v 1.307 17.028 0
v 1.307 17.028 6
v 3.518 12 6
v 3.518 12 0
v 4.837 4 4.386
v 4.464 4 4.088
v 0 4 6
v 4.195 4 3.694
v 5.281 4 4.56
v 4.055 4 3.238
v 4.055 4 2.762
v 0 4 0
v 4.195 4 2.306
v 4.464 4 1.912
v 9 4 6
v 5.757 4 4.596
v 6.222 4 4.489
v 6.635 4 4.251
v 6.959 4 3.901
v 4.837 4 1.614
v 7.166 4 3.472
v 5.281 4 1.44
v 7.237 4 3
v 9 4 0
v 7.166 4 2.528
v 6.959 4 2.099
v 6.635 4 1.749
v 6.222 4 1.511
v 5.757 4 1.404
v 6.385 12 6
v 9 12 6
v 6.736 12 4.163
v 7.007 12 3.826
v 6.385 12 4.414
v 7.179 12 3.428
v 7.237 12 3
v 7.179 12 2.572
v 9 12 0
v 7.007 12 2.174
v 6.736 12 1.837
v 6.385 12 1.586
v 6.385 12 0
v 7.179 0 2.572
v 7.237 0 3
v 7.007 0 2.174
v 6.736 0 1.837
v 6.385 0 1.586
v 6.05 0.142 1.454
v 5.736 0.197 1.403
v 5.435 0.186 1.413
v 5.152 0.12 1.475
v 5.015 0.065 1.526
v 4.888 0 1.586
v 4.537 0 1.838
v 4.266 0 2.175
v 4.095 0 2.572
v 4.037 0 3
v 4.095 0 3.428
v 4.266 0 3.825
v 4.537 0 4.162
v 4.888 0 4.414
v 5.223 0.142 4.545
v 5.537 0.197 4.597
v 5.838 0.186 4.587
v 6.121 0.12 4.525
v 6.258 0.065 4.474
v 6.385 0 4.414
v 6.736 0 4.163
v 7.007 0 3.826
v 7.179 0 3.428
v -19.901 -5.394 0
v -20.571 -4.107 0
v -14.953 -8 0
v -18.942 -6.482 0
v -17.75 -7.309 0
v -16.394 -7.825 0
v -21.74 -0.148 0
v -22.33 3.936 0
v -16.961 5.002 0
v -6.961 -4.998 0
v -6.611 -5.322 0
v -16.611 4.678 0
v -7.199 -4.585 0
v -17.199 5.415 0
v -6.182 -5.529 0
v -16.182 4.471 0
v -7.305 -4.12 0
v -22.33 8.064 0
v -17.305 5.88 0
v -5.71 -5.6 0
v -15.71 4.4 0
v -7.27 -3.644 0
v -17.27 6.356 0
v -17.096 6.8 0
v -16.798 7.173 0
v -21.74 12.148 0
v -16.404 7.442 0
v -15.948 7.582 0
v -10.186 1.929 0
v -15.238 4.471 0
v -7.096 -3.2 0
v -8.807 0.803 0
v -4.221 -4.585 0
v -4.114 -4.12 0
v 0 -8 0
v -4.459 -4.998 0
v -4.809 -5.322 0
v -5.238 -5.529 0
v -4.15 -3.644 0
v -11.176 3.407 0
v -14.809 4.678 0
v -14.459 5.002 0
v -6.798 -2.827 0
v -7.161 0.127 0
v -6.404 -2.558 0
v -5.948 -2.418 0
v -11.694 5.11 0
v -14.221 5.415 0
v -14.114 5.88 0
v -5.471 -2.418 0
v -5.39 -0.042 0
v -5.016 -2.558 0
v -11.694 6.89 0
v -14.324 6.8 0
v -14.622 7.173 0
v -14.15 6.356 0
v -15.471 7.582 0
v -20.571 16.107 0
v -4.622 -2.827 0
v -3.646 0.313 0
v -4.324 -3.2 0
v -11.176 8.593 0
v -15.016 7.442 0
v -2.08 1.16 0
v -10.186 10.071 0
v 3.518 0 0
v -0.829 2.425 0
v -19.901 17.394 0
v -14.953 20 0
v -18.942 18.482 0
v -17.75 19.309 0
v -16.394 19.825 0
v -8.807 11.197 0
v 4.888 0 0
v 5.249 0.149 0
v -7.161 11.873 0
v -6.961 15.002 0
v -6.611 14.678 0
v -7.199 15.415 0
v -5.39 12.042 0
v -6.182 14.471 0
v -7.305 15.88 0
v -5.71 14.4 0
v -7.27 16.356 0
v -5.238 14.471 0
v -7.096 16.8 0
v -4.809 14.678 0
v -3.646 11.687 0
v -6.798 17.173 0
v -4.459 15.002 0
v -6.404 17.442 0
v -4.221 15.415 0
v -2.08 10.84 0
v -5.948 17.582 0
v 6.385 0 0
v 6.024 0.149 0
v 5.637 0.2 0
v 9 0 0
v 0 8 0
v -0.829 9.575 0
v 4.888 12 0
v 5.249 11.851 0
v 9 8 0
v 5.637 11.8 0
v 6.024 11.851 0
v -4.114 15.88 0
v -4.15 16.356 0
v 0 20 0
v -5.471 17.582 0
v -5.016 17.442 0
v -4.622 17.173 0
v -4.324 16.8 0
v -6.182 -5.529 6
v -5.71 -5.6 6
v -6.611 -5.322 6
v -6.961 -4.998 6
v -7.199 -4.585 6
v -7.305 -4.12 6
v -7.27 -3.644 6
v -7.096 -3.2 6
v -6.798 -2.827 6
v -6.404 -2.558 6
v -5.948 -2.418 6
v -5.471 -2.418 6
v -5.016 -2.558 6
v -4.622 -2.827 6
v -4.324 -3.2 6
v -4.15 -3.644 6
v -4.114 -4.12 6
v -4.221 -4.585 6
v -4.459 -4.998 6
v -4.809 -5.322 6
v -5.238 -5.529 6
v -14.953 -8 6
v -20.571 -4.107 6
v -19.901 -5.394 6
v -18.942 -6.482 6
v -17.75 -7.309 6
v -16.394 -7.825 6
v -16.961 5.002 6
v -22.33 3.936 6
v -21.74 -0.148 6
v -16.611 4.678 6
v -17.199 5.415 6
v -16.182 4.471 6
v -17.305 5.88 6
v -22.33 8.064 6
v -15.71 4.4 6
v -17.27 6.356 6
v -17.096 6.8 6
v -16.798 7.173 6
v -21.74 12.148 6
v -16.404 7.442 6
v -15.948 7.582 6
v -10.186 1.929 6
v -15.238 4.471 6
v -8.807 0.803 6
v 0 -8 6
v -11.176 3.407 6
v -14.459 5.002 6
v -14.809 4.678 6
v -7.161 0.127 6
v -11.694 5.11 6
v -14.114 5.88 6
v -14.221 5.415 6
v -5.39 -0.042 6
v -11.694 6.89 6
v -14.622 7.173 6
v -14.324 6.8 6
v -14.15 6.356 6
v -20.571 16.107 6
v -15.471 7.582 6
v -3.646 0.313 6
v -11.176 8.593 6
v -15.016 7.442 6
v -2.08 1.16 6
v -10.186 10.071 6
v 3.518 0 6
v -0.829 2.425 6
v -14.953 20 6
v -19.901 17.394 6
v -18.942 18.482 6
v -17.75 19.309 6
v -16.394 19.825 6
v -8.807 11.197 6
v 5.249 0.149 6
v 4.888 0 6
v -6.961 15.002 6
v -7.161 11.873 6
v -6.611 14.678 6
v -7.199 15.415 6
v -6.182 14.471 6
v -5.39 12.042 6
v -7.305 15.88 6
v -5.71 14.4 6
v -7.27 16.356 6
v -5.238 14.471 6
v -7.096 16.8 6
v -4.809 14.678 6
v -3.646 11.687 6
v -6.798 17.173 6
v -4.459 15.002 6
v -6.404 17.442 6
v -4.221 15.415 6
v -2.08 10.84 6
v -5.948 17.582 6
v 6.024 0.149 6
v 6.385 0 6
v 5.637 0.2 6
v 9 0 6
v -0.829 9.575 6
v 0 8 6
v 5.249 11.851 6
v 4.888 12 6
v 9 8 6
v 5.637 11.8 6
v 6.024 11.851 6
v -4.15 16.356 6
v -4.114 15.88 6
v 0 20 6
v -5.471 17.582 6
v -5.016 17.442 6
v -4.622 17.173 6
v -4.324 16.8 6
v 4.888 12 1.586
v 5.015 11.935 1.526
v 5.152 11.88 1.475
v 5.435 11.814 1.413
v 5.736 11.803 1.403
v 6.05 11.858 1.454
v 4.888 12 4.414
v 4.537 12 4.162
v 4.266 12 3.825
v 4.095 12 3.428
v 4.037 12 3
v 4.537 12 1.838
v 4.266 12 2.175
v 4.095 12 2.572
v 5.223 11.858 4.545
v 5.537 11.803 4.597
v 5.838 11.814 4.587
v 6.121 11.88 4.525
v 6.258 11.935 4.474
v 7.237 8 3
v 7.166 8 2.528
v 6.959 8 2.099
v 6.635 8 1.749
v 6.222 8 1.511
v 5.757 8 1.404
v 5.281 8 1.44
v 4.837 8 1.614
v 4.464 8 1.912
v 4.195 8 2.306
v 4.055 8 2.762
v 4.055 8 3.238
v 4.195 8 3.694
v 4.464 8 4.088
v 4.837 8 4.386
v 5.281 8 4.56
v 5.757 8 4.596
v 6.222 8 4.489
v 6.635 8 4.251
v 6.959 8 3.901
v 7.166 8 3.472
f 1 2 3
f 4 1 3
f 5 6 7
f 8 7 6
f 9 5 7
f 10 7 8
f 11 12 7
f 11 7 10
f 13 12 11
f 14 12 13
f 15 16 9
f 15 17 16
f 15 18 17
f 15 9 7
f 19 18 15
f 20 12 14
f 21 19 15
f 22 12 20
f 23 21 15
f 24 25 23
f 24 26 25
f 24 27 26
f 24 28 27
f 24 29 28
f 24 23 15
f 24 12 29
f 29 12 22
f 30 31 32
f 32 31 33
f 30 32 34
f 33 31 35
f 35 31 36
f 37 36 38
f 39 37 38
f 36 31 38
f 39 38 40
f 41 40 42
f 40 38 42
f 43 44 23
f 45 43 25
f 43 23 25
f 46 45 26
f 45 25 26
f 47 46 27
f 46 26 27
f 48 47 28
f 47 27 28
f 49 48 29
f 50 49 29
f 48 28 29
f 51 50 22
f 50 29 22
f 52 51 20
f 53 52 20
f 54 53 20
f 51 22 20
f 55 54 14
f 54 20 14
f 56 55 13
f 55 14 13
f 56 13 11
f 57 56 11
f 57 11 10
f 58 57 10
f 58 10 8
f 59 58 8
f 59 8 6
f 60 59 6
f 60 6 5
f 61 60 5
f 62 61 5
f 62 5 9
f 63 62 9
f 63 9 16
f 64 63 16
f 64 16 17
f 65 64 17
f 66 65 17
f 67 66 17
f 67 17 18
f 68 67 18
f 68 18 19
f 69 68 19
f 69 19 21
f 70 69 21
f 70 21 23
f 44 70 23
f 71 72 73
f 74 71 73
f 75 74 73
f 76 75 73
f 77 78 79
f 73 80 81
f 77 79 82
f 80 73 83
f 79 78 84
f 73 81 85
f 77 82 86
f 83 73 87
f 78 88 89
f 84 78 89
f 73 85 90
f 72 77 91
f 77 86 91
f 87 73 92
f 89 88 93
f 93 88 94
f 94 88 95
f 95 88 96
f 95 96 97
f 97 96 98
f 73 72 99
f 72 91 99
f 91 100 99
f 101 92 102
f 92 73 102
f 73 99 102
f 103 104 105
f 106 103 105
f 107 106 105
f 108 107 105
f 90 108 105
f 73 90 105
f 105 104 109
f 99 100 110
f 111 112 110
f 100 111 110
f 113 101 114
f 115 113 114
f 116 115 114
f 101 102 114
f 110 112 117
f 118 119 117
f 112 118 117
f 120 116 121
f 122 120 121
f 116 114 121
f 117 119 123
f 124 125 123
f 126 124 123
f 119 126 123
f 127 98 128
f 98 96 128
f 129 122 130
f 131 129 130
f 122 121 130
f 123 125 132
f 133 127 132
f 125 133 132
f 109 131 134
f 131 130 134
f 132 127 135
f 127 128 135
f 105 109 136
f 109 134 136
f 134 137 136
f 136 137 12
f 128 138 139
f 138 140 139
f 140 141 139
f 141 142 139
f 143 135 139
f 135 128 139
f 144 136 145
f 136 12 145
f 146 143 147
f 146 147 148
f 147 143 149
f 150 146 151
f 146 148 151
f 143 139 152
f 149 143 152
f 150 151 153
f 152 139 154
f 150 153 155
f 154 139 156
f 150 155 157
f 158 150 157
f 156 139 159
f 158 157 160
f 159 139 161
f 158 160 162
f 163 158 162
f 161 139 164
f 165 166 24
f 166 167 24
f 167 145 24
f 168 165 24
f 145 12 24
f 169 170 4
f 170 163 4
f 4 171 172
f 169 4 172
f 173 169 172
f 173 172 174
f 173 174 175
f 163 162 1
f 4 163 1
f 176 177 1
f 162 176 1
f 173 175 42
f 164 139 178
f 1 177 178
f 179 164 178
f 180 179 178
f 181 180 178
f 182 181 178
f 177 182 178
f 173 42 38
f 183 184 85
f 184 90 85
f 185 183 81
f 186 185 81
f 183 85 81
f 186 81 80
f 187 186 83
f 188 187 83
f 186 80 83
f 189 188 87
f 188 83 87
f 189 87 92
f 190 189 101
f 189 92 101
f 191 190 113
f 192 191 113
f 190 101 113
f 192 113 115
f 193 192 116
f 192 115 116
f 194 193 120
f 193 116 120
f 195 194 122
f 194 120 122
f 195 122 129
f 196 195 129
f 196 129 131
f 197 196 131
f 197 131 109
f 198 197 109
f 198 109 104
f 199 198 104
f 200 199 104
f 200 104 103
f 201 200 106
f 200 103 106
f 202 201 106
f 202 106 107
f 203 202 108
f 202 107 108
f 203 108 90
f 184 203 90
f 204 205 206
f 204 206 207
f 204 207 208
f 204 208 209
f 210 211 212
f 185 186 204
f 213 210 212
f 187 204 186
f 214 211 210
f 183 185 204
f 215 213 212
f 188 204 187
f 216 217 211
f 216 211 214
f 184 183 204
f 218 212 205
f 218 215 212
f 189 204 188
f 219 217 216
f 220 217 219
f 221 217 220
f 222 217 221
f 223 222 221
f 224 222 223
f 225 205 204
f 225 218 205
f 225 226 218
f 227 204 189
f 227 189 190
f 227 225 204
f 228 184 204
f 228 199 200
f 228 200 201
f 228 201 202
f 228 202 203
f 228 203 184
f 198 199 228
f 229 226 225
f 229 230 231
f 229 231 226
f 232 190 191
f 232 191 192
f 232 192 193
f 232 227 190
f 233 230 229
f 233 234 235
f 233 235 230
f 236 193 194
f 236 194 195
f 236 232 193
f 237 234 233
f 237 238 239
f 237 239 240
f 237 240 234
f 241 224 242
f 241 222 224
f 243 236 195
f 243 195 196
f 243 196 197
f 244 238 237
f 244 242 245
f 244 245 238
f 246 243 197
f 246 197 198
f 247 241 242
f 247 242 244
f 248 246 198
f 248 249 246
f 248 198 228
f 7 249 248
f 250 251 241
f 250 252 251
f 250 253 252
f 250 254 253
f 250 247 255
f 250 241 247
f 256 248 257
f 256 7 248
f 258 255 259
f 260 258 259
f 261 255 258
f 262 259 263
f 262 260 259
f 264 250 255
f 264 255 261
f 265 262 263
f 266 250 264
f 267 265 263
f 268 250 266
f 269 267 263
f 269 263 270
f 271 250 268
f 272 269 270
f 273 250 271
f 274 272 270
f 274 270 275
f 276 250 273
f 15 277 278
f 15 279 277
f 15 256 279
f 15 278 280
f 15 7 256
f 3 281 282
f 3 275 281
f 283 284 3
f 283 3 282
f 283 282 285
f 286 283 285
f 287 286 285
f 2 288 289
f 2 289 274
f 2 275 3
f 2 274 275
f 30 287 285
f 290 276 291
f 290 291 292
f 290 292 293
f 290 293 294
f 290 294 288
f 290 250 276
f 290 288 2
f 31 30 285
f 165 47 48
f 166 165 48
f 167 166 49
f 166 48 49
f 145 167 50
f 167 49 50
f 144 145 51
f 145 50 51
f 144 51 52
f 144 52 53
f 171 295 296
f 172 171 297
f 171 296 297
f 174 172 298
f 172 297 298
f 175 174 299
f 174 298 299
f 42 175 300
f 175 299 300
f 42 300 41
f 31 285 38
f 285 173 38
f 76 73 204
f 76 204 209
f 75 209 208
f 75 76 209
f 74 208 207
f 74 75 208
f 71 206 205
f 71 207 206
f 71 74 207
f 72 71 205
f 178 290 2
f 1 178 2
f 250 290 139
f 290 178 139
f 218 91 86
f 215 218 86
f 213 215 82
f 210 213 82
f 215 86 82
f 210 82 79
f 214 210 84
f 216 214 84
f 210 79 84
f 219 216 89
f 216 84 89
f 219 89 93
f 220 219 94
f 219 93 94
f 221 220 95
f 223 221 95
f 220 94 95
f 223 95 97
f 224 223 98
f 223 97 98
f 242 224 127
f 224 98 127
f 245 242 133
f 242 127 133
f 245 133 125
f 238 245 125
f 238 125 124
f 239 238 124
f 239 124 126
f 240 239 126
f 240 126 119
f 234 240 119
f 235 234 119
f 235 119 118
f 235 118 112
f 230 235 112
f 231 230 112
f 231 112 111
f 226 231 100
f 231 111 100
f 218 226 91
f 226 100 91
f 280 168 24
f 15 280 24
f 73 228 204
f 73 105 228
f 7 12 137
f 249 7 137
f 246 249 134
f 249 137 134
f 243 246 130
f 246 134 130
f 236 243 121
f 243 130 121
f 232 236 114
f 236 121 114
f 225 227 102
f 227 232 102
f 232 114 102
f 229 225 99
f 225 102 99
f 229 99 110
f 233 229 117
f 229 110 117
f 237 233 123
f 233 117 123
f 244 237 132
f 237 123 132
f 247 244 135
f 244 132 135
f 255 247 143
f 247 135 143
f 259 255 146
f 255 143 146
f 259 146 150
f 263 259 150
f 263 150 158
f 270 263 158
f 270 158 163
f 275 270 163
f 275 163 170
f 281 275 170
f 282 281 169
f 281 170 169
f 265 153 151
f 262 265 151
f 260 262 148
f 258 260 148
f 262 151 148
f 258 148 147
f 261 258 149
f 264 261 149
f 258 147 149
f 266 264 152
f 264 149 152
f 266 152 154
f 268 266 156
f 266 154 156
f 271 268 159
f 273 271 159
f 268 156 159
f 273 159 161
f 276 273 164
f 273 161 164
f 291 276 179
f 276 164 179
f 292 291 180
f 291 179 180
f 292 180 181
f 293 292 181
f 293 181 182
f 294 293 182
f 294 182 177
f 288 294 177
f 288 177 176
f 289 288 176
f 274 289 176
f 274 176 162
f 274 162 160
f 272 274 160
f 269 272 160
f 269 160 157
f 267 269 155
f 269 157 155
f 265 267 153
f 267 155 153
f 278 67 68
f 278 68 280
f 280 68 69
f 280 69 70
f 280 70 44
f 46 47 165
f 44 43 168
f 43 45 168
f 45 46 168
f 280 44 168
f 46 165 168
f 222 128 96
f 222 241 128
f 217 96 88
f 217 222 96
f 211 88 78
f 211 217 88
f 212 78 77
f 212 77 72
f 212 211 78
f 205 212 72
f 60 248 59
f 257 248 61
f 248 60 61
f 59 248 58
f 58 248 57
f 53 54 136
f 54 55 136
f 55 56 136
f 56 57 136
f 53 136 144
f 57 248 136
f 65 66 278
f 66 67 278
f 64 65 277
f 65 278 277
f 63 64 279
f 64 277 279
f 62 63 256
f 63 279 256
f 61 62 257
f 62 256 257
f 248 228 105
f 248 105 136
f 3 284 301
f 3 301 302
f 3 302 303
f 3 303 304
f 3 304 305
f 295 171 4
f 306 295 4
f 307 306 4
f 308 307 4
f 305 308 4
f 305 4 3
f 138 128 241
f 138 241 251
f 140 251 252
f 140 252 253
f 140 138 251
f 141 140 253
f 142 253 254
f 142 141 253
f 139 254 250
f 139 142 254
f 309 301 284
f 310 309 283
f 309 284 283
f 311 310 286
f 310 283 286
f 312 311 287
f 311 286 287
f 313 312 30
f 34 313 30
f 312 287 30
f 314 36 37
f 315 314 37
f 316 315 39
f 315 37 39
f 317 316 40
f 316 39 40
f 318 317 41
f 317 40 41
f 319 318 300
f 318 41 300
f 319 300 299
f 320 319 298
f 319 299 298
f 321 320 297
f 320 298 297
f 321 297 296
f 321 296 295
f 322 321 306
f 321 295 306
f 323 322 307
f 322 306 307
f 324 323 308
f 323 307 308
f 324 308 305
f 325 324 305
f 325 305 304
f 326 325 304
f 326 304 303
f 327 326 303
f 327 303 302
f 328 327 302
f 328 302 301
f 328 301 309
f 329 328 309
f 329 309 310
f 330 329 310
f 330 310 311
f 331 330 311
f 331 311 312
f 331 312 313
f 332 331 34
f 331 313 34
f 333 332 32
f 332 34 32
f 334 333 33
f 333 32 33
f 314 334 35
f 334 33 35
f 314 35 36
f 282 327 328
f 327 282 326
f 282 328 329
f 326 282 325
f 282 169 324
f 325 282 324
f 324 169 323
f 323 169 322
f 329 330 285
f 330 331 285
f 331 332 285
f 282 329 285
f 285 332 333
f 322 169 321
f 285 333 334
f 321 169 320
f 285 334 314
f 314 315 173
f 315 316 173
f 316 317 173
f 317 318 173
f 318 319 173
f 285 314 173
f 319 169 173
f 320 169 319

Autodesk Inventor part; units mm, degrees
ref_plane "YZ Plane" through (0, 0, 0) normal (1, 0, 0) x (0, 1, 0)
ref_plane "XZ Plane" through (0, 0, 0) normal (0, 1, 0) x (-1, 0, 0)
ref_plane "XY Plane" through (0, 0, 0) normal (0, 0, 1) x (1, 0, 0)
sketch "スケッチ1" plane through (0, 0, 0) normal (0, 0, 1) x (1, 0, 0)
  line L0 (9, 0) -> (9, 4)
  line L1 (9, 12) -> (2.2731, 12)
  line L2 (0, 8) -> (9, 8)
  line L3 (0, 4) -> (9, 4)
  line L4 (9, 8) -> (9, 12)
  arc A0 (0, 8) -> (0, 4) centre (-5.7099, 6) ccw
  line L5 (2.2731, 12) -> (0, 14.2779)
  line L6 (2.2731, 0) -> (-5.7099, -8)
  line L7 (-5.7099, 20) -> (-15.7099, 20)
  line L8 (-5.7099, -8) -> (-15.7099, -8)
  line L9 (-15.7099, 20) -> (-25.7698, 20)
  line L10 (-25.7698, 20) -> (-25.7698, -8)
  line L11 (-25.7698, -8) -> (-15.7099, -8)
  line L12 (2.2731, 0) -> (9, 0)
  line L13 (0, 14.2779) -> (-5.7099, 20)
  point P0 (0, 0)
  point P1 (4.5, 12)
  point P2 (4.5, 0)
  point P3 (4.5, 4)
  point P4 (-25.7099, 6)
  dimension "d4" = 12.1
  dimension "d5" = 4
  dimension "d6" = 14
  dimension "d7" = 14
  dimension "d8" = 10
  dimension "d9" = 10
  dimension "d10" = 20
  dimension "d12" = 14
extrude "押し出し1" add sketch "スケッチ1" along normal blind 6
sketch "スケッチ2" plane through (0, 0, 6) normal (0, 0, 1) x (1, 0, 0)
  circle A0 centre (5.6365, 13.3) radius 1.5
  line L0 (9, 8) -> (9, 12) projected
  line L1 (11.5477, 6) -> (-28.1936, 6) construction
  line L2 (9, 12) -> (2.2731, 12) projected
  circle A1 centre (5.6365, -1.3) radius 1.5
  point P0 (0, 0)
  point P1 (4.8882, 12)
  point P2 (6.3849, 12)
  dimension "d15" = 3
  dimension "d16" = 3.3635
  dimension "d17" = 1.3
extrude "押し出し2" cut sketch "スケッチ2" against normal blind 6 contours A0 L2 | A1 picked at (5.4614, 13.0013)
sketch "スケッチ3" plane through (0, 0, 6) normal (0, 0, 1) x (1, 0, 0)
  circle A0 centre (5.6365, 13.3) radius 1.5
  line L0 (9, 12) -> (2.2731, 12) projected
  point P0 (0, 0)
  point P1 (4.8882, 12)
  point P2 (6.3849, 12)
  dimension "d20" = 3
  dimension "d21" = 1.3
extrude "押し出し3" add sketch "スケッチ3" against normal blind 6 contours A0 L0 picked at (5.4614, 13.0013)
sketch "スケッチ4" plane through (0, 0, 6) normal (0, 0, 1) x (1, 0, 0)
  arc A0 (6.3849, 12) -> (4.8882, 12) centre (5.6365, 13.3) ccw projected
  circle A1 centre (5.6365, 13.3) radius 1.5
  point P0 (0, 0)
  dimension "d24" = 3
extrude "押し出し4" cut sketch "スケッチ4" against normal blind 6
fillet "フィレット1" radius 5 1 edges at (-25.7698, 20, 3)
fillet "フィレット2" radius 5 1 edges at (-25.7698, -8, 3)
fillet "フィレット3" radius 3 4 edges at (-5.7099, -8, 3) (2.2731, 0, 3) (-5.7099, 20, 3) (2.2731, 12, 3)
sketch "スケッチ6" plane through (0, 4, 0) normal (0, 1, 0) x (1, 0, 0)
  point P0 (0, 0)
sketch "スケッチ7" plane through (4.8882, 12, 6) normal (0, 1, 0) x (1, 0, 0)
  circle A0 centre (0.7488, 3) radius 1.6
  line L0 (1.4967, 0) -> (0, 0) projected
  line L1 (4.1118, 6) -> (4.1118, 0) projected
  point P0 (-4.8882, 6)
  point P1 (0.7483, 0)
  dimension "d43" = 3.2
  dimension "d44" = 3
  dimension "d45" = 3.363
extrude "押し出し5" cut sketch "スケッチ7" against normal blind 28
sketch "スケッチ11" plane through (0, 0, 6) normal (0, 0, 1) x (1, 0, 0)
  line L0 (-6.9544, 20) -> (-20.7698, 20) projected
  line L1 (-20.7698, 20) -> (-6.9544, 20)
  arc A0 (1.394, 12.8809) -> (3.5176, 12) centre (3.5176, 15) ccw projected
  line L2 (0, 20) -> (1.3068, 17.0279)
  arc A1 (1.394, 12.8809) -> (3.5176, 12) centre (3.5176, 15) ccw
  arc A2 (-4.8308, 19.1191) -> (-6.9544, 20) centre (-6.9544, 17) ccw projected
  arc A3 (-4.8308, 19.1191) -> (-6.9544, 20) centre (-6.9544, 17) ccw
  line L3 (1.394, 12.8809) -> (-4.8308, 19.1191) projected
  line L4 (-4.8308, 19.1191) -> (1.394, 12.8809)
  arc A4 (0, 8) -> (0, 4) centre (-5.7099, 6) ccw projected
  line L5 (-11.7599, 6) -> (12.1155, 6) construction
  line L6 (-20.7698, -8) -> (0, -8)
  line L7 (0, -8) -> (3.5176, 0)
  arc A5 (-6.9544, -8) -> (-4.8308, -7.1191) centre (-6.9544, -5) ccw
  line L8 (1.394, -0.8809) -> (-4.8308, -7.1191)
  line L9 (-6.9544, 20) -> (0, 20)
  line L10 (1.3068, 17.0279) -> (3.5176, 12)
  arc A6 (3.5176, 0) -> (1.394, -0.8809) centre (3.5176, -3) ccw
  point P0 (0, 0)
extrude "押し出し6" add sketch "スケッチ11" against normal blind 6
sketch "スケッチ12" plane through (0, 0, 6) normal (0, 0, 1) x (1, 0, 0)
  arc A0 (0, 8) -> (0, 4) centre (-5.7099, 6) ccw projected
  point P0 (0, 0)
  point P1 (-15.7099, 6)
  point P2 (-5.7099, 16)
  point P3 (-5.7099, -4)
  dimension "d74" = 10
  dimension "d76" = 10
  dimension "d77" = 10
hole "穴4" at (-15.7099, 6, 6) at (-5.7099, 16, 6) at (-5.7099, -4, 6) direction (0, 0, -1) diameter 3.2 end through all
sketch "スケッチ13" plane through (0, 0, 6) normal (0, 0, 1) x (1, 0, 0)
  line L0 (-20.7698, -8) -> (0, -8) projected
  line L1 (0, 20) -> (-20.7698, 20) projected
  line L2 (-18.7698, 20) -> (-18.7698, -8) construction
  line L3 (-25.7698, 15) -> (-25.7698, -3) projected
  arc A0 (-18.7698, 20) -> (-18.7698, -8) centre (6.3784, 6) ccw
  line L4 (-18.7698, 20) -> (-29.3351, 20)
  line L5 (-29.3351, 20) -> (-29.3351, -8)
  line L6 (-29.3351, -8) -> (-18.7698, -8)
  point P0 (0, 0)
  dimension "d85" = 7
extrude "押し出し7" cut sketch "スケッチ13" against normal blind 6
fillet "フィレット4" radius 6 1 edges at (-18.7698, 20, 3)
fillet "フィレット5" radius 6 1 edges at (-18.7698, -8, 3)
properties part number "射出_腕固定" material "ポリカーボネート、クリア"
